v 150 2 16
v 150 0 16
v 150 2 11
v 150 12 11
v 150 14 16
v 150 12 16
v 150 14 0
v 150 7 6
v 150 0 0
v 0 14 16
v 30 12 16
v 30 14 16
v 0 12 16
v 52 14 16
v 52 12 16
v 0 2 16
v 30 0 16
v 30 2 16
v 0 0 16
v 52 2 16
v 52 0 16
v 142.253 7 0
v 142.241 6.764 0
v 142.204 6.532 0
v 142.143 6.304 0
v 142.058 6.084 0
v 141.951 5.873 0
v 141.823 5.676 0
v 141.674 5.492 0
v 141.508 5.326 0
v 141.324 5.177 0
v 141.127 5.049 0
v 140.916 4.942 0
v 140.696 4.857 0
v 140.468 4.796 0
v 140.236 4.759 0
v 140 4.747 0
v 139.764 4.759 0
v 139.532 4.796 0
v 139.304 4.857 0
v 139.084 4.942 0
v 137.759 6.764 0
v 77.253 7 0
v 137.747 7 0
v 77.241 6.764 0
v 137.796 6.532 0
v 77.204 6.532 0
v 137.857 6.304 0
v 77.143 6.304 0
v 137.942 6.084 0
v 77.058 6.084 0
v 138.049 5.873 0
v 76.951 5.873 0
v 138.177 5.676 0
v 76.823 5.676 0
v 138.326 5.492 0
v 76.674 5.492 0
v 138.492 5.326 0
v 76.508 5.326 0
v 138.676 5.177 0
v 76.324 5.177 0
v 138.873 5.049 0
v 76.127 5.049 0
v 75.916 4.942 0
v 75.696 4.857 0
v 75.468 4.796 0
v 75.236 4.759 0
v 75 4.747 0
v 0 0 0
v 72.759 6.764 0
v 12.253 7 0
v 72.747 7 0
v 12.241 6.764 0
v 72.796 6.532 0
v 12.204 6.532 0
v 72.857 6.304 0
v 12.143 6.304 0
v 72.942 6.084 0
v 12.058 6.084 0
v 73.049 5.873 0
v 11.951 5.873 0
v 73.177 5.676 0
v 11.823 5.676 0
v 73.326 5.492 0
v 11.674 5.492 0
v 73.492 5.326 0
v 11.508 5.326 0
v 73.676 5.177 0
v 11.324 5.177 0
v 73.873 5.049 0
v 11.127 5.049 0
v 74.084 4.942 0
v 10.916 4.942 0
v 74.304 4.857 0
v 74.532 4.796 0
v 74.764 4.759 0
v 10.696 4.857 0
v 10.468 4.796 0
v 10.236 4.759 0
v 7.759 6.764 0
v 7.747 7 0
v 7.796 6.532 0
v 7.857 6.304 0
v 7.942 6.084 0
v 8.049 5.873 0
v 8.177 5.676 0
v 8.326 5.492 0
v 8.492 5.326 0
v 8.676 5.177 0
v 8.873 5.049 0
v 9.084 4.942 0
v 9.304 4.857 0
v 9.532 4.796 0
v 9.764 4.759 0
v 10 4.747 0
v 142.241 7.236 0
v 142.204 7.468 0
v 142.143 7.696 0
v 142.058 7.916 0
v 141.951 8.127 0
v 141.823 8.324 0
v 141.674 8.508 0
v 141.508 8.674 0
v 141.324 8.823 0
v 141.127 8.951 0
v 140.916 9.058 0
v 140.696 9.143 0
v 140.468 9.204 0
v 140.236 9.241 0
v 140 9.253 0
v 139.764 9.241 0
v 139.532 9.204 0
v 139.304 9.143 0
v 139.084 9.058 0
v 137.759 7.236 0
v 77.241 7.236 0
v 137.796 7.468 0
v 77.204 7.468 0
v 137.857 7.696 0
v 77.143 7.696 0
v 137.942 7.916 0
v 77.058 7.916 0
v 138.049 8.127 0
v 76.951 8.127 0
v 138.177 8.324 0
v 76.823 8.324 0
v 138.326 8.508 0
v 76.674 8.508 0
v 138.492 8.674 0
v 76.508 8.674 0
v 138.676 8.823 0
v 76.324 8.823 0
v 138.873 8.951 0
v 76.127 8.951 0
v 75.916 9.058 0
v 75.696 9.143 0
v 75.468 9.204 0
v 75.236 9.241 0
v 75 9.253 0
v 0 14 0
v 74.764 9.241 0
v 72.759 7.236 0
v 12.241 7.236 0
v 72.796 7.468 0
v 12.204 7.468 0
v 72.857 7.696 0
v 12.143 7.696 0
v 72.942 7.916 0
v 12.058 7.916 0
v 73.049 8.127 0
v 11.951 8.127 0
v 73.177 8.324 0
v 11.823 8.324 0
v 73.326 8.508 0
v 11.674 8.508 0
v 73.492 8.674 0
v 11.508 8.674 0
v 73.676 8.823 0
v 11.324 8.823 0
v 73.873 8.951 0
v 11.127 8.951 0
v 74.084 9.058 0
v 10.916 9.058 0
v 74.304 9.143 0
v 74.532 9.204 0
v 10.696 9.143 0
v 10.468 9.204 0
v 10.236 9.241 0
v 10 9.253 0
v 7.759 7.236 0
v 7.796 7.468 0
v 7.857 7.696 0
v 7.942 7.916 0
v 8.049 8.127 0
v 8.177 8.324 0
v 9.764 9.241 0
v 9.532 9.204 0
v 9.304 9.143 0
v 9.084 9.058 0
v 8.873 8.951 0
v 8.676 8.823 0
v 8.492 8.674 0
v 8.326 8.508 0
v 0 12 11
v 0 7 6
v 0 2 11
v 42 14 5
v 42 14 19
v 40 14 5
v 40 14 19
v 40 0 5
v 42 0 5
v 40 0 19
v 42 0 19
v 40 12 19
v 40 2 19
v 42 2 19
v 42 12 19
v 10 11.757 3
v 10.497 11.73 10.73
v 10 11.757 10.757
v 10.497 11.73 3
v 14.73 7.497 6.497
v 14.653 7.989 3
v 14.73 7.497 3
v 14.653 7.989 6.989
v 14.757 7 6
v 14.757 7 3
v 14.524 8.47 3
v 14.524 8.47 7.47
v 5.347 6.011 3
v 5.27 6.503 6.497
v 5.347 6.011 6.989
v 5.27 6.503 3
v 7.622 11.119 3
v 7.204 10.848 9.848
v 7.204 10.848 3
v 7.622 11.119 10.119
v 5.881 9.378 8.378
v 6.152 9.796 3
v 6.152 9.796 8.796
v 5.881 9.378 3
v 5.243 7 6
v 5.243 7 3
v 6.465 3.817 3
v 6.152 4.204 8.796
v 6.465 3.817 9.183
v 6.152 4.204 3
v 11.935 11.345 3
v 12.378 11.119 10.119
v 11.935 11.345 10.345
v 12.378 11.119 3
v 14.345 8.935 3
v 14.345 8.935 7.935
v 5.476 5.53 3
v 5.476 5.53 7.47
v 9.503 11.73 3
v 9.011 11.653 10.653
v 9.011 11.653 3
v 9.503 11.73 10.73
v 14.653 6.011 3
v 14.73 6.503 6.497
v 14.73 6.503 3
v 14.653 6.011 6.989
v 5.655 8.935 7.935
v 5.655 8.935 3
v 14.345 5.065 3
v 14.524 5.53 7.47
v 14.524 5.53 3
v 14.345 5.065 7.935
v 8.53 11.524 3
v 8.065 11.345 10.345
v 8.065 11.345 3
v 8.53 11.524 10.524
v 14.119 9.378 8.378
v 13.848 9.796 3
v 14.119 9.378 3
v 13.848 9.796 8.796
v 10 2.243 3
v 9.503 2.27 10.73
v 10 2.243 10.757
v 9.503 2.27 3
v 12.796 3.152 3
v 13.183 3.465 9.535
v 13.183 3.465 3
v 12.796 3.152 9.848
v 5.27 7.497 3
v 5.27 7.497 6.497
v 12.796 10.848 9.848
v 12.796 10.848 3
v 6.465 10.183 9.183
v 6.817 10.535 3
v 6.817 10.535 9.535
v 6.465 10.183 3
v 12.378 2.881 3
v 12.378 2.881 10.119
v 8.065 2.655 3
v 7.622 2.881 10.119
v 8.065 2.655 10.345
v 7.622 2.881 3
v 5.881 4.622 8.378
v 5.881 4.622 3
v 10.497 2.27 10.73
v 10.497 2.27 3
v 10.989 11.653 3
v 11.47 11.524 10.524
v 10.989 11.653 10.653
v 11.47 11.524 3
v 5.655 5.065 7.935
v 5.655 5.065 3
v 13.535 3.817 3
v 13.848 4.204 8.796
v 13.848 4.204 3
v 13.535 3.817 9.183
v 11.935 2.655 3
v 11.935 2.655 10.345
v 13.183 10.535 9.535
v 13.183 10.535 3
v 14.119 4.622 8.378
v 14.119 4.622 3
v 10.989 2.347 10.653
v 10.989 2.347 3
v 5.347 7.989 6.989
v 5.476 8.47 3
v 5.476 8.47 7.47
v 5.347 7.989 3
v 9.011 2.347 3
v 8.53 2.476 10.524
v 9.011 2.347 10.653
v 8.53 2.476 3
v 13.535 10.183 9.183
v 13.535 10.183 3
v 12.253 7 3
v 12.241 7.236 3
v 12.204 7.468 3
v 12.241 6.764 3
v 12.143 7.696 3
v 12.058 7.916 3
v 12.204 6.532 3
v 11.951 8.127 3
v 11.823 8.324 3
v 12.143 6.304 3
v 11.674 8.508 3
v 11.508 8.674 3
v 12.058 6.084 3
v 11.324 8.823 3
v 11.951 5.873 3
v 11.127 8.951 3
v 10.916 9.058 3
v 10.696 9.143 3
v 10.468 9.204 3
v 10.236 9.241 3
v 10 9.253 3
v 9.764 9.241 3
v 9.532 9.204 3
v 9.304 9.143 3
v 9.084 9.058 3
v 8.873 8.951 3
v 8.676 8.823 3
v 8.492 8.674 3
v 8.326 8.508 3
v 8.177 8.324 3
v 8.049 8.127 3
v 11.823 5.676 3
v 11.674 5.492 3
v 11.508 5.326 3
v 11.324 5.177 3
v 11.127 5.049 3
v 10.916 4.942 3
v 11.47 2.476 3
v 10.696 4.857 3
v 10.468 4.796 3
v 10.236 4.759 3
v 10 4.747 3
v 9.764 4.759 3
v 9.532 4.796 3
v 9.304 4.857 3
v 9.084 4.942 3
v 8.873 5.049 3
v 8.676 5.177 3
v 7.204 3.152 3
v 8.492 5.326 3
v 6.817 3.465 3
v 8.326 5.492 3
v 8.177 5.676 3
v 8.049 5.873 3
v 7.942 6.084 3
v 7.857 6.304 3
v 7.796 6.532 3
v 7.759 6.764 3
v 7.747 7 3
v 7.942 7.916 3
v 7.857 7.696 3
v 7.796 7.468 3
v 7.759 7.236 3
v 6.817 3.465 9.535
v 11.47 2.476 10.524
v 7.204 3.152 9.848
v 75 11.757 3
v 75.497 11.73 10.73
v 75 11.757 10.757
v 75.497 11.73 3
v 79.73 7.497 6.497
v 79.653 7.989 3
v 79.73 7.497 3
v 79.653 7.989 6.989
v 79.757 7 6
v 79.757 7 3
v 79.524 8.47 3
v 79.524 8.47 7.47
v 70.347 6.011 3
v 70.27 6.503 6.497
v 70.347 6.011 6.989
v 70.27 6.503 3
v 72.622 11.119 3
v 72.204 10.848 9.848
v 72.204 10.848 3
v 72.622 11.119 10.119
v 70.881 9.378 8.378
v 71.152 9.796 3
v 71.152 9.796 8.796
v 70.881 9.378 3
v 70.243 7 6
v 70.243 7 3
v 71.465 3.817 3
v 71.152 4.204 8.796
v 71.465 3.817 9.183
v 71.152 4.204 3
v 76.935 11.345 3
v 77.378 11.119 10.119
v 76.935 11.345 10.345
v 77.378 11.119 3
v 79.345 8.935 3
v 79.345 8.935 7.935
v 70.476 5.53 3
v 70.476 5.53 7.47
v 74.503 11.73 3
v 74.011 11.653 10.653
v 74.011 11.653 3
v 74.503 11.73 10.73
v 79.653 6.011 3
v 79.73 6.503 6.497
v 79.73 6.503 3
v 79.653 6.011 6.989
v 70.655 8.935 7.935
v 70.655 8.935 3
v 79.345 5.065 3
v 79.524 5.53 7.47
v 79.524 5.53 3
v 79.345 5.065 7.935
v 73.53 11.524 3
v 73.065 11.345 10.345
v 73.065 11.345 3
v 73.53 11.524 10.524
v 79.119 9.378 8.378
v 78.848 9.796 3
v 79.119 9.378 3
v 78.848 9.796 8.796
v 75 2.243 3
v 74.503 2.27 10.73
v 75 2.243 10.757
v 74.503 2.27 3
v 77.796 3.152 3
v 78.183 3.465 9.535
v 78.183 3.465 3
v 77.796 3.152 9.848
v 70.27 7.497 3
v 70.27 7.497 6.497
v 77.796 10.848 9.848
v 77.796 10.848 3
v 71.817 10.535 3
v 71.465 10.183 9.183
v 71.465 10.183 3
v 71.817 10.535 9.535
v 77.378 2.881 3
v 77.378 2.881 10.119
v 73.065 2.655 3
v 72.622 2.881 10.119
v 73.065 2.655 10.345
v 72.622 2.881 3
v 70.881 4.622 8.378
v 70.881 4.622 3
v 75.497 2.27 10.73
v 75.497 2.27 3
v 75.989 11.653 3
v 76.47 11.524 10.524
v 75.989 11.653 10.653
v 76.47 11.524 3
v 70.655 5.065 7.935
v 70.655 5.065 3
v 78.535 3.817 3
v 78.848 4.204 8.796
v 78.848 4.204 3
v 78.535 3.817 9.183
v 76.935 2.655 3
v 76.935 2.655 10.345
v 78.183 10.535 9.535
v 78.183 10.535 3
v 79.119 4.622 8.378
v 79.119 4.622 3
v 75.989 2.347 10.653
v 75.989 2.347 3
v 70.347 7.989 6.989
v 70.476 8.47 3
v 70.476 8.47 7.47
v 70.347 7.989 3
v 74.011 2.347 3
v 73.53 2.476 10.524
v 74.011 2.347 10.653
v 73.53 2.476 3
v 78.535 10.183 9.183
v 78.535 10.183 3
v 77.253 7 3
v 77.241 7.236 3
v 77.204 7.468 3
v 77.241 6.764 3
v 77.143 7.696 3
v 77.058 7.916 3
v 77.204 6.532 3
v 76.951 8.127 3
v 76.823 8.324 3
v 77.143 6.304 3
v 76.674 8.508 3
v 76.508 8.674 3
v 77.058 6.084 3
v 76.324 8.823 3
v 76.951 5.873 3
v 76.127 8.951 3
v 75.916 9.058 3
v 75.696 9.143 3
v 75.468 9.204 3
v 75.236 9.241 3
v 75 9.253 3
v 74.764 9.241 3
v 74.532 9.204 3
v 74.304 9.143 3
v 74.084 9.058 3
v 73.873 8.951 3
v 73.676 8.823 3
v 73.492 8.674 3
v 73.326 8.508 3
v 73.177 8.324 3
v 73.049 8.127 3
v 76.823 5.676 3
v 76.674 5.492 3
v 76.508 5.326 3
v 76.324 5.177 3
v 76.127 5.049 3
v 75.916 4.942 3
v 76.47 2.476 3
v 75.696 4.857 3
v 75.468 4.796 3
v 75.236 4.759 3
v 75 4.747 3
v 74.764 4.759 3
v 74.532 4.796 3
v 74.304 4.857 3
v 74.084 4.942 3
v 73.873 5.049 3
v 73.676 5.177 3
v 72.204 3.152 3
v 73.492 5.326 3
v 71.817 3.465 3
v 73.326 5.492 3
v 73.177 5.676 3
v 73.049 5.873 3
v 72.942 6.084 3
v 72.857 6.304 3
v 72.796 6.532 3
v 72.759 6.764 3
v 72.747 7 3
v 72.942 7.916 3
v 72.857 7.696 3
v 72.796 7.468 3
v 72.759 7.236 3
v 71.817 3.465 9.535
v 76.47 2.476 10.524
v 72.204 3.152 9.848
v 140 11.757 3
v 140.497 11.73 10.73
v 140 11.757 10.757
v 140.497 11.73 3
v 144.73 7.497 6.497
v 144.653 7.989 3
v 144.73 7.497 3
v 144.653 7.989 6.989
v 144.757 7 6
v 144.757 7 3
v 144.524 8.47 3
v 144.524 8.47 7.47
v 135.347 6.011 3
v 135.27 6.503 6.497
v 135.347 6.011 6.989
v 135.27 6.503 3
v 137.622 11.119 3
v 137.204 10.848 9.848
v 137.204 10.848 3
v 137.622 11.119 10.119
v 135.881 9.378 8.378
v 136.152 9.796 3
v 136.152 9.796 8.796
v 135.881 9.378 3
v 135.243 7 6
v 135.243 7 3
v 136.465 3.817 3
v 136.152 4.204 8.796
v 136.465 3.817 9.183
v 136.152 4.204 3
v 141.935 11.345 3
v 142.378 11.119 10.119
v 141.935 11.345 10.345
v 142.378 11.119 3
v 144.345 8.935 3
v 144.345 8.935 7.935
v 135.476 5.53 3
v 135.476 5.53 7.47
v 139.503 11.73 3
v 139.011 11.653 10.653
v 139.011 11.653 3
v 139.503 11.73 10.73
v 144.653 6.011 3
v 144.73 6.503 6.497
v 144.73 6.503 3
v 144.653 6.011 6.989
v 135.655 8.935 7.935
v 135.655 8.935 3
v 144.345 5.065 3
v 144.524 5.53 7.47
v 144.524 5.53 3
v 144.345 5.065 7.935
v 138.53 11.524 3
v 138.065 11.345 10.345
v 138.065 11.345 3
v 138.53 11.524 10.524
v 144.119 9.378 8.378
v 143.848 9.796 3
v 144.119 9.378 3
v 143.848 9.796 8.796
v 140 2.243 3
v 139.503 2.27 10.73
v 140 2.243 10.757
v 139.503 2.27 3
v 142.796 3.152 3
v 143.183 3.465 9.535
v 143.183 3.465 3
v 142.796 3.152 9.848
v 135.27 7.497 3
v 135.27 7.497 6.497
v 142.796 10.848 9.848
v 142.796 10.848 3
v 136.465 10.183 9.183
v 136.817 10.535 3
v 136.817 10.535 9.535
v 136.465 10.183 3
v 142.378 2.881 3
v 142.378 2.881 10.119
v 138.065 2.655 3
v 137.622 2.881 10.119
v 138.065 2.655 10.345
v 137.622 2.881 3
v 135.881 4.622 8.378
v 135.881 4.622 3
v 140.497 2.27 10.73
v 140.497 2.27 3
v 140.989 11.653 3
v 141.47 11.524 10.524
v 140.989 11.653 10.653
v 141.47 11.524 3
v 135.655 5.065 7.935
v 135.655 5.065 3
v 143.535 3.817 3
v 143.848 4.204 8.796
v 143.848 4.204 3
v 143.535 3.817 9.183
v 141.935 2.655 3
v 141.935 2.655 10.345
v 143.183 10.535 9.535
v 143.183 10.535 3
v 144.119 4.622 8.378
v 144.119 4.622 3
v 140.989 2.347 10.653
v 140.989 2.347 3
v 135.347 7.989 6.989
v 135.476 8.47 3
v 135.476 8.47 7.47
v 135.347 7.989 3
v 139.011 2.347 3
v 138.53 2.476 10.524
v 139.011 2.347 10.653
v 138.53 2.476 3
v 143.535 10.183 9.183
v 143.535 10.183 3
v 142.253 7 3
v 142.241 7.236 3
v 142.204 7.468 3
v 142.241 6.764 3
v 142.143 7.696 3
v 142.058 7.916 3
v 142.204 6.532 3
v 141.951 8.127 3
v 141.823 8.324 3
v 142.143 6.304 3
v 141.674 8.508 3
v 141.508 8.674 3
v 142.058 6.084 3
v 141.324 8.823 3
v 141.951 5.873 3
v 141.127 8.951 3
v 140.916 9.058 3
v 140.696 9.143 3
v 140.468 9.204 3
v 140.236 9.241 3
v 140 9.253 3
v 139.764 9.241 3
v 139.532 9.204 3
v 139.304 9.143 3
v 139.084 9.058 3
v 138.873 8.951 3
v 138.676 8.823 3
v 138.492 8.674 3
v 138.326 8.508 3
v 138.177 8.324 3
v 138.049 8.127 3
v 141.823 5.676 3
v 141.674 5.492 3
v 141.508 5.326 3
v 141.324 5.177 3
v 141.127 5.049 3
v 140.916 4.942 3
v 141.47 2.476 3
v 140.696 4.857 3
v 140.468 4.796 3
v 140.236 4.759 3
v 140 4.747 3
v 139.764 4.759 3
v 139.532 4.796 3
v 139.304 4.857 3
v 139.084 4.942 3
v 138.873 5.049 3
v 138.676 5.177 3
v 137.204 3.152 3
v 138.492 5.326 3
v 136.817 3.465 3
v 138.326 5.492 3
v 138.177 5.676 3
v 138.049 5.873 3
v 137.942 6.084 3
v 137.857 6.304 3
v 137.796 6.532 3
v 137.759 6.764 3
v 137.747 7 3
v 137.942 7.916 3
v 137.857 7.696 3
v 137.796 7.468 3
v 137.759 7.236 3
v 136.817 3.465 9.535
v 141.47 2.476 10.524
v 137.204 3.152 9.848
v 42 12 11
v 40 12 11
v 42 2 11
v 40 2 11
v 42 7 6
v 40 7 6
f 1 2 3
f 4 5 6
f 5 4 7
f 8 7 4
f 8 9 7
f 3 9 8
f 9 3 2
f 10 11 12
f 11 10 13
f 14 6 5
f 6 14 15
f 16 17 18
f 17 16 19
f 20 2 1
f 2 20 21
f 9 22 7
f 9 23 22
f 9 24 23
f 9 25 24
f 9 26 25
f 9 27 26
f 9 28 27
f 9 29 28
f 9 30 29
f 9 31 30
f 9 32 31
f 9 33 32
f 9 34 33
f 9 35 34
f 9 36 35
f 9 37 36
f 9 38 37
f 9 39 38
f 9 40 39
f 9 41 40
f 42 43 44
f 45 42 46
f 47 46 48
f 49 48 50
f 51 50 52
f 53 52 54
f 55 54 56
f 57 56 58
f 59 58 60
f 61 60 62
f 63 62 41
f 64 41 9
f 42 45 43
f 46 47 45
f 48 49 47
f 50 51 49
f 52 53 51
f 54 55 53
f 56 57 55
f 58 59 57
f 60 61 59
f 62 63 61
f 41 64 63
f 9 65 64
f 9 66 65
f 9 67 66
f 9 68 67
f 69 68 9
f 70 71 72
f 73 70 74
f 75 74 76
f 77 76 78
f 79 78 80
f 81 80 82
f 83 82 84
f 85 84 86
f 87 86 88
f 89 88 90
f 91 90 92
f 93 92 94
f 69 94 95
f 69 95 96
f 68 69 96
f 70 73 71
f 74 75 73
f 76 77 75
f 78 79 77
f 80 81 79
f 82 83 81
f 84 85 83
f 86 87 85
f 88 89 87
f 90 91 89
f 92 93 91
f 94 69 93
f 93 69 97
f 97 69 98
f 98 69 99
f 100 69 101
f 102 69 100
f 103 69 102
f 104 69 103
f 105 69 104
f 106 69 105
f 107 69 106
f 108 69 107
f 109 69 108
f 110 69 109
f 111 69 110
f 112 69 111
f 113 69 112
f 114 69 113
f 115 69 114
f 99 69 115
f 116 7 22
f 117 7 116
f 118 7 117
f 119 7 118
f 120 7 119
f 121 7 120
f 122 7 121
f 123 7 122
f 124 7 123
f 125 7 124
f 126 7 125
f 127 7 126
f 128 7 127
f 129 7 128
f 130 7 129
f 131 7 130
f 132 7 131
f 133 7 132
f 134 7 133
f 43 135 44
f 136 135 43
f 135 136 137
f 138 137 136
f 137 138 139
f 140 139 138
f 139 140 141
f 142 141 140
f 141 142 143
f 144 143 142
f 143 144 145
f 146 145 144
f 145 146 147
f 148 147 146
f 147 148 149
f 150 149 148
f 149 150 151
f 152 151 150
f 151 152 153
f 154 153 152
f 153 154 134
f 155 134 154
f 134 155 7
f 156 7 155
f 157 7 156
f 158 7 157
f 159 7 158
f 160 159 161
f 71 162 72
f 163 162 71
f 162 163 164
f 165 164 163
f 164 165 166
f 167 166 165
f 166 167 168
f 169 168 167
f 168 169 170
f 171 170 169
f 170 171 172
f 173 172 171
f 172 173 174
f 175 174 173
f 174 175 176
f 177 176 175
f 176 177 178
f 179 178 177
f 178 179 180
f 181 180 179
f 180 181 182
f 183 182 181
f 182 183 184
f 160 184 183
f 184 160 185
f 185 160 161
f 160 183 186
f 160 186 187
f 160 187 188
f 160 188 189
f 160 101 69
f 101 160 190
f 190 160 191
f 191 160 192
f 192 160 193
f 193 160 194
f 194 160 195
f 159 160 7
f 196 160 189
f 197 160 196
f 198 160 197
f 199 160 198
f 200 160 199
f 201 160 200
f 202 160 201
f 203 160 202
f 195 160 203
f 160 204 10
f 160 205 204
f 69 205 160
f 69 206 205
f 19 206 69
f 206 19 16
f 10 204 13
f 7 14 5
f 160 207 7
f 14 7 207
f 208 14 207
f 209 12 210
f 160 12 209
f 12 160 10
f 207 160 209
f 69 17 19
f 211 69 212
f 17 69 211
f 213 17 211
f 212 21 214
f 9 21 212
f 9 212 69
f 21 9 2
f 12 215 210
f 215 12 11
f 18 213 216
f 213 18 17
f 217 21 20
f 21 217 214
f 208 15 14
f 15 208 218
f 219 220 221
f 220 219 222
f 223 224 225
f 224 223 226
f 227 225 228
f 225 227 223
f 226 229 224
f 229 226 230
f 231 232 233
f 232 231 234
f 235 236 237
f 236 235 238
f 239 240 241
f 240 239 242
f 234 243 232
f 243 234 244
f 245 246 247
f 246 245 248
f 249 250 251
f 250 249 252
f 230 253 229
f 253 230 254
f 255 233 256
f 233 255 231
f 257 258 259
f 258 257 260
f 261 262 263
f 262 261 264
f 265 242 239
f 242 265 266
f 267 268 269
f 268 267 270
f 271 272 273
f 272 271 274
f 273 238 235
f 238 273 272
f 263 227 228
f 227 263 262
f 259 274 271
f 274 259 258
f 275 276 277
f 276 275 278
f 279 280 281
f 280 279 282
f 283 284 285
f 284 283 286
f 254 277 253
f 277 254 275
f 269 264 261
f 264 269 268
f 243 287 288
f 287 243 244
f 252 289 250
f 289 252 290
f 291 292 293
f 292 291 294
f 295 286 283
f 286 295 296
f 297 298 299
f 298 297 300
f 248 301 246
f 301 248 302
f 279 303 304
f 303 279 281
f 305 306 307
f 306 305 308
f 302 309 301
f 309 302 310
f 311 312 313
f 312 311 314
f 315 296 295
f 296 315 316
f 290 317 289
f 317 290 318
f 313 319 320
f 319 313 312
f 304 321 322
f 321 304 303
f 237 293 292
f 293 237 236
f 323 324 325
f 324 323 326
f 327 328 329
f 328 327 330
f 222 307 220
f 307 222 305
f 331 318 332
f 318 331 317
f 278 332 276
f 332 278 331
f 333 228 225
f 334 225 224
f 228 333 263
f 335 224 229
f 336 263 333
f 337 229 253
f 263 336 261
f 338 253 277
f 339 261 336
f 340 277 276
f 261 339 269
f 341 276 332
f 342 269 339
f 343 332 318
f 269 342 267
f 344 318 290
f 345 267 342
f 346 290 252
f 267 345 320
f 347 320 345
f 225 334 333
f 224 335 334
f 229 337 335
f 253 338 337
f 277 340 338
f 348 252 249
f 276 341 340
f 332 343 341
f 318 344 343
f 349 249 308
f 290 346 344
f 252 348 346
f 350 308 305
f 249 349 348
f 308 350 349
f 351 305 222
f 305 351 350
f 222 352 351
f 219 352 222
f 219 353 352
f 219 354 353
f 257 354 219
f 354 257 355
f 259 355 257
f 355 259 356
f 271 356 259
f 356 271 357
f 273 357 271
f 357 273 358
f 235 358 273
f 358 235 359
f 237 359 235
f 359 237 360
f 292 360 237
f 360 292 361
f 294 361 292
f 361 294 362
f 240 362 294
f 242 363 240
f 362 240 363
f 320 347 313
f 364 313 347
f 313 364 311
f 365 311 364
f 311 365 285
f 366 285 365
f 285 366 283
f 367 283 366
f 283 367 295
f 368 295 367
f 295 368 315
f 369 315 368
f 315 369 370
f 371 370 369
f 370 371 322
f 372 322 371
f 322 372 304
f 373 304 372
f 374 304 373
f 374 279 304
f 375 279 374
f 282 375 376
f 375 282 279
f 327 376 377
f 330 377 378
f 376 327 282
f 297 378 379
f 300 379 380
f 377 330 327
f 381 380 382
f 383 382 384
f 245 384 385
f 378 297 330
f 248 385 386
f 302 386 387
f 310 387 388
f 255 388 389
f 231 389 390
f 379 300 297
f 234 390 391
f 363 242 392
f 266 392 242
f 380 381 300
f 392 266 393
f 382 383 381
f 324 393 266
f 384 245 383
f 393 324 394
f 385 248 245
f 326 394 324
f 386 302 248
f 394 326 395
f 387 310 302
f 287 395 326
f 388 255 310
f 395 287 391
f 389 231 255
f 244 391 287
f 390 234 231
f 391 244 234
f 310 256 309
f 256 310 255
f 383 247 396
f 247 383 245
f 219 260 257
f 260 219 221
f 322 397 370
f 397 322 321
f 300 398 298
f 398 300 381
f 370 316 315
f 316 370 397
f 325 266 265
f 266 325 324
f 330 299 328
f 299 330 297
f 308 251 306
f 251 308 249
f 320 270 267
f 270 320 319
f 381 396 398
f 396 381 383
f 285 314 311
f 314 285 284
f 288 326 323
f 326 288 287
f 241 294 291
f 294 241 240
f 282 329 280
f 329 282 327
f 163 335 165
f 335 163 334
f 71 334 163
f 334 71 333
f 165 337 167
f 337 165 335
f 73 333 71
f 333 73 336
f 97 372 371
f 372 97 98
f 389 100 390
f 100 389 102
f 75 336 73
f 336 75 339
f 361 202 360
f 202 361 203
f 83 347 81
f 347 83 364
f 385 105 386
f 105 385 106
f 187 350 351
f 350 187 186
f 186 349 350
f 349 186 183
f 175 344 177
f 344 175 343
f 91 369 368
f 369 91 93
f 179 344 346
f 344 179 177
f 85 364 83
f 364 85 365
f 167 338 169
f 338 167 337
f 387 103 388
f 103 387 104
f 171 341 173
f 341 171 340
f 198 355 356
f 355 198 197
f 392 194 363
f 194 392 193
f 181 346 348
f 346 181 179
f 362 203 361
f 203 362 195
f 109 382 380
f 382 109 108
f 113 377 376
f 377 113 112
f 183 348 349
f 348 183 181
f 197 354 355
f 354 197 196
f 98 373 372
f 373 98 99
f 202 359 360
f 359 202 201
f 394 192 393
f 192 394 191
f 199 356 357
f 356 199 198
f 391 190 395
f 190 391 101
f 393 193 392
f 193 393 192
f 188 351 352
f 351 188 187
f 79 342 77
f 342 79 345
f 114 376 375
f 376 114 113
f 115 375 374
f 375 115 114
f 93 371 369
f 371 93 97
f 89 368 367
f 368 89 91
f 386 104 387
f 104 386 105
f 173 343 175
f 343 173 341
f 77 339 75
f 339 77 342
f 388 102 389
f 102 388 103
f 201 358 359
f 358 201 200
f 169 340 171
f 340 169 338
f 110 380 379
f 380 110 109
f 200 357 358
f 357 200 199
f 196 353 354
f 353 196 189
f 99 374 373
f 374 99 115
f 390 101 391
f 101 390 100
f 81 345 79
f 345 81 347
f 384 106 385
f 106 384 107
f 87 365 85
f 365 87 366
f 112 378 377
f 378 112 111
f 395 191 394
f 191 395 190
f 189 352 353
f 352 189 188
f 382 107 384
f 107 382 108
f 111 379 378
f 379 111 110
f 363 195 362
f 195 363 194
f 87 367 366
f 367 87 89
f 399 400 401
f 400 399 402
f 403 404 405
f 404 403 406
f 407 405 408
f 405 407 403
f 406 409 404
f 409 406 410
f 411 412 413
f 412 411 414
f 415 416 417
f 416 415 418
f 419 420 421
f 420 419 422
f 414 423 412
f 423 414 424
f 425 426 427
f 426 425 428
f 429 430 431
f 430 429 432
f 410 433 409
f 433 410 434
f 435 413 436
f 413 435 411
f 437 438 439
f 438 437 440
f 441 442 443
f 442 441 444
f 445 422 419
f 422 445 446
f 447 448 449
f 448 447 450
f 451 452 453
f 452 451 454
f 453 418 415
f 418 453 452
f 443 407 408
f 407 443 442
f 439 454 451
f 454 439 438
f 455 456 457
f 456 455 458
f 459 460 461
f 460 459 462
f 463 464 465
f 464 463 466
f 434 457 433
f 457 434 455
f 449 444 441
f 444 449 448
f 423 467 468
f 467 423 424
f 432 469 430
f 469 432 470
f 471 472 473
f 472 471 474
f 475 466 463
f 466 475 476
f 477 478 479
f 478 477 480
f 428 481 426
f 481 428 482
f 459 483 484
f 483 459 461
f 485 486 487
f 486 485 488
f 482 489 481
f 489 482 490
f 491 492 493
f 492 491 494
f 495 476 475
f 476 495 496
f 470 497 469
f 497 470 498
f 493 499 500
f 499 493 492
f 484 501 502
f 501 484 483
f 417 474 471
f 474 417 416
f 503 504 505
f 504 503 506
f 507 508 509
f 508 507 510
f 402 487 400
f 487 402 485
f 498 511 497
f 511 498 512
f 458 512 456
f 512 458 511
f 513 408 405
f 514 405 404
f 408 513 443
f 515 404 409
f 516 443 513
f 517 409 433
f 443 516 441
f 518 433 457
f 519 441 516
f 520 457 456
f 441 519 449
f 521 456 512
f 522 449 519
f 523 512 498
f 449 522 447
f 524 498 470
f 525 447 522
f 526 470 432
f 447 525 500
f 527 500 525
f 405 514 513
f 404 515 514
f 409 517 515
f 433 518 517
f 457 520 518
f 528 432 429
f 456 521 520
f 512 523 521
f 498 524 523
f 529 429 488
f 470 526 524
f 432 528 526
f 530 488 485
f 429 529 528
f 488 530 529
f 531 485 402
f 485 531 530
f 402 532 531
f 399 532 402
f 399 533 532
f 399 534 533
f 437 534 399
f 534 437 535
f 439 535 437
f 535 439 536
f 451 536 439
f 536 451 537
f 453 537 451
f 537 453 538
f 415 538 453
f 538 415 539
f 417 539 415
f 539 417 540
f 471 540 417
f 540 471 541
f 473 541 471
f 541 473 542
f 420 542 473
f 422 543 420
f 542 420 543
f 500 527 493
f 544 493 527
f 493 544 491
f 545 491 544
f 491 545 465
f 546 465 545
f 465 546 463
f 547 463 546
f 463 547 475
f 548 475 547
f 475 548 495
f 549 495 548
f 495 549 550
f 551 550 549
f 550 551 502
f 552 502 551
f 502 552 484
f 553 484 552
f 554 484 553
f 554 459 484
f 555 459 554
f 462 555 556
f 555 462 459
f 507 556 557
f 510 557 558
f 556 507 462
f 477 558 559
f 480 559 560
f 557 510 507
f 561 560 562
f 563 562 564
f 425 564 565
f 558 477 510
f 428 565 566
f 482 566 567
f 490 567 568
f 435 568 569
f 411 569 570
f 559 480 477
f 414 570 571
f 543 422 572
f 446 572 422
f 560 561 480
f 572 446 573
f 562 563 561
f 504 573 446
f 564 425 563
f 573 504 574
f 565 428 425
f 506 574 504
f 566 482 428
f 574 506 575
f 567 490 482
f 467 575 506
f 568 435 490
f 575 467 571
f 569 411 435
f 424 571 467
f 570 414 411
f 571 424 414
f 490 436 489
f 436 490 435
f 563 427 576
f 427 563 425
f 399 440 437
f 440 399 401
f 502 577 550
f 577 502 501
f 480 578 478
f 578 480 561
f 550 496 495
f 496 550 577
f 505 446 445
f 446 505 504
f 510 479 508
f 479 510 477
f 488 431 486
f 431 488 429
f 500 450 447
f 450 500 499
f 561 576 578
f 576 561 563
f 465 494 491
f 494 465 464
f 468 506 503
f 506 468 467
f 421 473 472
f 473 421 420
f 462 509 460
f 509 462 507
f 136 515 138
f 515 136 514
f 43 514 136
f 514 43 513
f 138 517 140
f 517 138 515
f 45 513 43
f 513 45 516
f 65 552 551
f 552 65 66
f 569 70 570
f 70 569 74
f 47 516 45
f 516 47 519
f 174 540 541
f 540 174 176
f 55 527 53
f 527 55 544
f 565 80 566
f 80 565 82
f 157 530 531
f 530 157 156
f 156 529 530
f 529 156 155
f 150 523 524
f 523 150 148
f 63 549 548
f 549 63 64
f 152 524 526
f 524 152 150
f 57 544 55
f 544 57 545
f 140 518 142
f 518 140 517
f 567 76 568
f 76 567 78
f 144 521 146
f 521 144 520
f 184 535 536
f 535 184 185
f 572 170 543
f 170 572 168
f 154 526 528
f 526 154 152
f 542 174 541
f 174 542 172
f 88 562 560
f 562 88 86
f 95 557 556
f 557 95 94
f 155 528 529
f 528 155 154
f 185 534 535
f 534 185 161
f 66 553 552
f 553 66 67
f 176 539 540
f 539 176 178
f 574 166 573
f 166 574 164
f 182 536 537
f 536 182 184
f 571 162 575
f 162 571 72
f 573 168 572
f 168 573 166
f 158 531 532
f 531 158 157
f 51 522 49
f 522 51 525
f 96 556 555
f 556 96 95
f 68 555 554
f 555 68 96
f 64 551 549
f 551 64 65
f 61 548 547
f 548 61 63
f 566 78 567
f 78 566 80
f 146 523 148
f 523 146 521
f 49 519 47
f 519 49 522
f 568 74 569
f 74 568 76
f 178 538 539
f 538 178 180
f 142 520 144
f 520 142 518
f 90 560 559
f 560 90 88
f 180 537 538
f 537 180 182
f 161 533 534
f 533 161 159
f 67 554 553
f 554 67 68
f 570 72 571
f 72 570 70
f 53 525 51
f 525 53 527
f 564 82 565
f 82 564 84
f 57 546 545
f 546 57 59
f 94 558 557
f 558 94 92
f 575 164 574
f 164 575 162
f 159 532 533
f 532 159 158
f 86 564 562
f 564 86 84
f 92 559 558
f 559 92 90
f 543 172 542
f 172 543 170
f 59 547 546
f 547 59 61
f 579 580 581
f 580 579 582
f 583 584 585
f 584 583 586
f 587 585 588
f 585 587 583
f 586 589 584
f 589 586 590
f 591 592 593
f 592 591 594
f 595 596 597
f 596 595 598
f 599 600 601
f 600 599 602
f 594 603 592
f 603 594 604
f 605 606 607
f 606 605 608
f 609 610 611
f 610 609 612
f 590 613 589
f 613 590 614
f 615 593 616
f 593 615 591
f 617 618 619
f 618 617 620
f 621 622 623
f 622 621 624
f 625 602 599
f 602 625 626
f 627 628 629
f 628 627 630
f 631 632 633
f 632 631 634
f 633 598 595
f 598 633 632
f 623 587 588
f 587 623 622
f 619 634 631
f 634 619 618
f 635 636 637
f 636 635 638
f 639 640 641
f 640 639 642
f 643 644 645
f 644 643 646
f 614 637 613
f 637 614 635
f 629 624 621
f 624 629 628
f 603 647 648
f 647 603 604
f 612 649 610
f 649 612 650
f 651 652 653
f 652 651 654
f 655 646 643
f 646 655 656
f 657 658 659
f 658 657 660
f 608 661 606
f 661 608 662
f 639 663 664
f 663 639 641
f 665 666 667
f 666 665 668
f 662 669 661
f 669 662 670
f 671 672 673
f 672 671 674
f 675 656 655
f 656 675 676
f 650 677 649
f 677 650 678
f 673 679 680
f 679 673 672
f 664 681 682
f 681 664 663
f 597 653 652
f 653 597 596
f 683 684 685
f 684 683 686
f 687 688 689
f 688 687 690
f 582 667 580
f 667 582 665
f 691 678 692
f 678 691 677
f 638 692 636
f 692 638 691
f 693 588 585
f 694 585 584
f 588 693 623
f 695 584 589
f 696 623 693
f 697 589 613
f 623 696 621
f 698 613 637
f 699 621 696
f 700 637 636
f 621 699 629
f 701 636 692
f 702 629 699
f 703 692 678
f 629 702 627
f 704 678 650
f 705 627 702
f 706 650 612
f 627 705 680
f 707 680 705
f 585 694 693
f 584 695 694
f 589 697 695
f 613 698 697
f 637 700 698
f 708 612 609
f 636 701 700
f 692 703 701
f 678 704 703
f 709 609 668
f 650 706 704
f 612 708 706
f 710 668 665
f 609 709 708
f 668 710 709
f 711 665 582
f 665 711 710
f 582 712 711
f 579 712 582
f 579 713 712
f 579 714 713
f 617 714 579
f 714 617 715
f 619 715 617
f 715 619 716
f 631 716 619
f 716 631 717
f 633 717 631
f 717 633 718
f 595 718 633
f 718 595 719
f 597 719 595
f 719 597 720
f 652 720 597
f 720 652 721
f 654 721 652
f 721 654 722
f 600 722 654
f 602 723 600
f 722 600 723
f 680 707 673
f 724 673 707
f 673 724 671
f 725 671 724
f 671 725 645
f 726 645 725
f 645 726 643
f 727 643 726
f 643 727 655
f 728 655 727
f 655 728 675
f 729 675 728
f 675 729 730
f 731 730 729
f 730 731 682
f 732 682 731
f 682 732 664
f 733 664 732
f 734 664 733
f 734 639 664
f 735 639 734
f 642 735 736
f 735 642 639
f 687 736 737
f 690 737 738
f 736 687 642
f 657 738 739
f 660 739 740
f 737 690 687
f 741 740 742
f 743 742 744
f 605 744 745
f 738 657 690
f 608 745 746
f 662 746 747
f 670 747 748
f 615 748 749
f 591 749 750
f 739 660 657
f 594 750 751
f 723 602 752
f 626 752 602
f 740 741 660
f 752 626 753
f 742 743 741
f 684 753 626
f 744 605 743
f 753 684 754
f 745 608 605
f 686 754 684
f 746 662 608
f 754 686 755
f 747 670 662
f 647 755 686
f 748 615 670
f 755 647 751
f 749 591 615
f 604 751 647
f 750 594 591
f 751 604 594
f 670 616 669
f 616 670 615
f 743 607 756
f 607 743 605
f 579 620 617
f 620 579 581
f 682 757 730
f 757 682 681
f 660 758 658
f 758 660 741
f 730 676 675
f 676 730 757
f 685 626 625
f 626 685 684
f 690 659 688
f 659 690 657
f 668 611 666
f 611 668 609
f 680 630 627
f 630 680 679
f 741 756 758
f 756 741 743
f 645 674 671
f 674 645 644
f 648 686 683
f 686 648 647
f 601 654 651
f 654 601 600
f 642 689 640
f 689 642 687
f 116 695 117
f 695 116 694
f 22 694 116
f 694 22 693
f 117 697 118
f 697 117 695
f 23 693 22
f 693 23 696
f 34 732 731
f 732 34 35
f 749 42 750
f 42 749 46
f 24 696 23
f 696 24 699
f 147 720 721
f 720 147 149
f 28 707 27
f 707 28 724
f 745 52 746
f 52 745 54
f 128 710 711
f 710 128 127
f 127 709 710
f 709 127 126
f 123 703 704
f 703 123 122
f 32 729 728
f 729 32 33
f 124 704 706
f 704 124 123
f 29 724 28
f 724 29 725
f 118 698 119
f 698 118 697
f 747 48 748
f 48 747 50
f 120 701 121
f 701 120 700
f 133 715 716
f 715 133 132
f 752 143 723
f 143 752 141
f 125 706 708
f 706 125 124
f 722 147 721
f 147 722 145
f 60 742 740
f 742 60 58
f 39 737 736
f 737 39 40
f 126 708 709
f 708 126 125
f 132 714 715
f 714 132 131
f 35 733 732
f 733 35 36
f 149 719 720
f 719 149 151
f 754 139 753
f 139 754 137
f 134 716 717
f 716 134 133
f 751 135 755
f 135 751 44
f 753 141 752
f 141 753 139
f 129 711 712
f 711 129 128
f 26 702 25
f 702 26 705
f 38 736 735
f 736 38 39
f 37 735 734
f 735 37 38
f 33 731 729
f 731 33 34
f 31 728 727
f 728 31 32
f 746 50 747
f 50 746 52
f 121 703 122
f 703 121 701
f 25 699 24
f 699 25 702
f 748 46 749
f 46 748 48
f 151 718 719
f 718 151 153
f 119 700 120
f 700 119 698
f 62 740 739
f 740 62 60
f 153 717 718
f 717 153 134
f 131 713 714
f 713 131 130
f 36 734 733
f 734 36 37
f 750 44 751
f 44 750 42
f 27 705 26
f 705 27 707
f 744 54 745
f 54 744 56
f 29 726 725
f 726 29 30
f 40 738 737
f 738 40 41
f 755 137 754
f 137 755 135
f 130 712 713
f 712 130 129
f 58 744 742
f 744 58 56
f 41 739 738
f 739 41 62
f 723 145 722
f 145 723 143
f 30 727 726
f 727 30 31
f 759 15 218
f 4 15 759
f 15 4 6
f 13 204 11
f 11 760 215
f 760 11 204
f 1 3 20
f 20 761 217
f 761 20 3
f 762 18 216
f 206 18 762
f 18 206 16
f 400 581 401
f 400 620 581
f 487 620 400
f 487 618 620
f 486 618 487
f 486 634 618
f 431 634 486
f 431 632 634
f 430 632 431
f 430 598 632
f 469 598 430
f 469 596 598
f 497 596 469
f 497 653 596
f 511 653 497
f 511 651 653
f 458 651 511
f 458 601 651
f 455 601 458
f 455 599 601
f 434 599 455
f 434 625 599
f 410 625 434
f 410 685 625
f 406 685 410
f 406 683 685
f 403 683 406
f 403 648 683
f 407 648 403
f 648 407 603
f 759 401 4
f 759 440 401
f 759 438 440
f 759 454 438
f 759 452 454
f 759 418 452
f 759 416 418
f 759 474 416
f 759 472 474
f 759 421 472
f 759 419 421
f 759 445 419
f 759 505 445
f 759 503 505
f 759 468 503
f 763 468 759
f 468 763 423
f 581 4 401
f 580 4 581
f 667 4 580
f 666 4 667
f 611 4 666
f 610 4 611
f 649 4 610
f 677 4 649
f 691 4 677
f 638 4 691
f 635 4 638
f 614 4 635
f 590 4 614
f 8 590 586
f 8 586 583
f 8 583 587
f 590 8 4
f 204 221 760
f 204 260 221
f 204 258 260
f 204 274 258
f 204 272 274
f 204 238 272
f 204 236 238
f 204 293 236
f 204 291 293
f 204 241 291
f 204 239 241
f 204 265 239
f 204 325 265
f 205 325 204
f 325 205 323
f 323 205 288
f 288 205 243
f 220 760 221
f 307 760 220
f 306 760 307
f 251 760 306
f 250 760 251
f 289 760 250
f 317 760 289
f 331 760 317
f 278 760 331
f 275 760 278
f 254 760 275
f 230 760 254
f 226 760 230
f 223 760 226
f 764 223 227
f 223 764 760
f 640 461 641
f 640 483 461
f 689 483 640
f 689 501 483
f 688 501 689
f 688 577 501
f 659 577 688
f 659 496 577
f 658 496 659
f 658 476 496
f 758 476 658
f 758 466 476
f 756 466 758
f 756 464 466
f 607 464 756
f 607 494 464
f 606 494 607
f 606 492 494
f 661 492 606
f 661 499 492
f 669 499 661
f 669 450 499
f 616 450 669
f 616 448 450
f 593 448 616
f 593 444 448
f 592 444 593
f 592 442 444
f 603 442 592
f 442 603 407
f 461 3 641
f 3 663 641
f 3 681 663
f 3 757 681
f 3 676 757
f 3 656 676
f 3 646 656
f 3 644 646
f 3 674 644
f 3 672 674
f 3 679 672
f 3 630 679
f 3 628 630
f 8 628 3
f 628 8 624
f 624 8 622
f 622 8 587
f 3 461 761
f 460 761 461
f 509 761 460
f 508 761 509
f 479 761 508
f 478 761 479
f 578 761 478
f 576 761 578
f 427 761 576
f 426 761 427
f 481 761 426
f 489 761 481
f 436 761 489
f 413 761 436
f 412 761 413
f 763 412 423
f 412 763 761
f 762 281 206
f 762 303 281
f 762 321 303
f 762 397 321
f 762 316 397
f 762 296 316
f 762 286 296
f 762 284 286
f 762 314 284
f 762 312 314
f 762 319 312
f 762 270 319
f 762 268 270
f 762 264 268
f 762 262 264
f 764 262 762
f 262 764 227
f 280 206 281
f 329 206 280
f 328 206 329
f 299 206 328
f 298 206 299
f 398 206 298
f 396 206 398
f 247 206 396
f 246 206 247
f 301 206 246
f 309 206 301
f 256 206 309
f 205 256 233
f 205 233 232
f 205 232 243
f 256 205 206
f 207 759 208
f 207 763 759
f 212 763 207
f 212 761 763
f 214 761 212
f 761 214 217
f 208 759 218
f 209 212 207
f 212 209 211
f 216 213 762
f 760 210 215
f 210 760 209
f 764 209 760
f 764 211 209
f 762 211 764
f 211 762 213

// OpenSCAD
length=150; // [50:150]
diameter=10; // [5:100]
// Horizontal clearance
clearance=0;
base_thickness=6; // [2:10]
wall_thickness=2; // [2:10]
notch_distance=40; // [20:40]
notch_width=2; // [2:5]
miter_height=3; // [2:5]
miter_width=10; // [5:10]

// Mount screw diameter, set to 0 to disable screw recesses.
screw_diameter=4.5;
screw_head_diameter=9.5;
screw_head_height=3;


/* [Hidden] */

half_clearance=clearance / 2;
height=base_thickness + diameter;
width=diameter + clearance + wall_thickness * 2;
screw_head_radius=screw_head_diameter/2;
screw_radius=screw_diameter/2;
max_cutout_size=diameter + miter_height + 1;

module cylinder_outer(height,radius,fn=60){
   fudge = 1/cos(180/fn);
   cylinder(h=height,r=radius*fudge,$fn=fn);}

difference() {
    union() {
        // main rectangle
        cube([length, width, height]);
        ridge_length=20 + notch_width;
        // the V rise around the notch
        translate([notch_distance - (miter_width), width, 0]) rotate([90, 0, 0]) linear_extrude(width) polygon([
                [0, 0],
                [0, height],
                [miter_width, height + miter_height],
                [miter_width + notch_width, height + miter_height],
                [miter_width * 2 + notch_width, height],
                [miter_width * 2 + notch_width, 0],
            ]);
    }
    // top retangular channel
    translate([0, wall_thickness, base_thickness + diameter * 0.5]) cube([length, diameter + clearance, 50]);

    // V channel that rod sits in
    translate([0, wall_thickness, base_thickness + diameter * 0.5]) rotate([90,0,0]) rotate([0,90,0]) linear_extrude(length) polygon([
    [0,1],
    [0,0],
    [diameter * 0.5 + half_clearance, -diameter * 0.5],
    [diameter + clearance, 0],
    [diameter + clearance, 1]
    ]);
    
    // notch
    translate([notch_distance, 0, base_thickness - 1]) cube([notch_width, width, max_cutout_size]);
    // screw holes
    if(screw_diameter) {
        for(x_offset=[10, length/2, length-10]) {
            translate([x_offset, width / 2, 0]) {
                union() {
                    translate([0,0,base_thickness-screw_head_height + 0]) cylinder_outer(screw_head_height + max_cutout_size, screw_head_radius);
                    cylinder_outer(base_thickness, screw_radius);
                }
            }
        }
    }
}
